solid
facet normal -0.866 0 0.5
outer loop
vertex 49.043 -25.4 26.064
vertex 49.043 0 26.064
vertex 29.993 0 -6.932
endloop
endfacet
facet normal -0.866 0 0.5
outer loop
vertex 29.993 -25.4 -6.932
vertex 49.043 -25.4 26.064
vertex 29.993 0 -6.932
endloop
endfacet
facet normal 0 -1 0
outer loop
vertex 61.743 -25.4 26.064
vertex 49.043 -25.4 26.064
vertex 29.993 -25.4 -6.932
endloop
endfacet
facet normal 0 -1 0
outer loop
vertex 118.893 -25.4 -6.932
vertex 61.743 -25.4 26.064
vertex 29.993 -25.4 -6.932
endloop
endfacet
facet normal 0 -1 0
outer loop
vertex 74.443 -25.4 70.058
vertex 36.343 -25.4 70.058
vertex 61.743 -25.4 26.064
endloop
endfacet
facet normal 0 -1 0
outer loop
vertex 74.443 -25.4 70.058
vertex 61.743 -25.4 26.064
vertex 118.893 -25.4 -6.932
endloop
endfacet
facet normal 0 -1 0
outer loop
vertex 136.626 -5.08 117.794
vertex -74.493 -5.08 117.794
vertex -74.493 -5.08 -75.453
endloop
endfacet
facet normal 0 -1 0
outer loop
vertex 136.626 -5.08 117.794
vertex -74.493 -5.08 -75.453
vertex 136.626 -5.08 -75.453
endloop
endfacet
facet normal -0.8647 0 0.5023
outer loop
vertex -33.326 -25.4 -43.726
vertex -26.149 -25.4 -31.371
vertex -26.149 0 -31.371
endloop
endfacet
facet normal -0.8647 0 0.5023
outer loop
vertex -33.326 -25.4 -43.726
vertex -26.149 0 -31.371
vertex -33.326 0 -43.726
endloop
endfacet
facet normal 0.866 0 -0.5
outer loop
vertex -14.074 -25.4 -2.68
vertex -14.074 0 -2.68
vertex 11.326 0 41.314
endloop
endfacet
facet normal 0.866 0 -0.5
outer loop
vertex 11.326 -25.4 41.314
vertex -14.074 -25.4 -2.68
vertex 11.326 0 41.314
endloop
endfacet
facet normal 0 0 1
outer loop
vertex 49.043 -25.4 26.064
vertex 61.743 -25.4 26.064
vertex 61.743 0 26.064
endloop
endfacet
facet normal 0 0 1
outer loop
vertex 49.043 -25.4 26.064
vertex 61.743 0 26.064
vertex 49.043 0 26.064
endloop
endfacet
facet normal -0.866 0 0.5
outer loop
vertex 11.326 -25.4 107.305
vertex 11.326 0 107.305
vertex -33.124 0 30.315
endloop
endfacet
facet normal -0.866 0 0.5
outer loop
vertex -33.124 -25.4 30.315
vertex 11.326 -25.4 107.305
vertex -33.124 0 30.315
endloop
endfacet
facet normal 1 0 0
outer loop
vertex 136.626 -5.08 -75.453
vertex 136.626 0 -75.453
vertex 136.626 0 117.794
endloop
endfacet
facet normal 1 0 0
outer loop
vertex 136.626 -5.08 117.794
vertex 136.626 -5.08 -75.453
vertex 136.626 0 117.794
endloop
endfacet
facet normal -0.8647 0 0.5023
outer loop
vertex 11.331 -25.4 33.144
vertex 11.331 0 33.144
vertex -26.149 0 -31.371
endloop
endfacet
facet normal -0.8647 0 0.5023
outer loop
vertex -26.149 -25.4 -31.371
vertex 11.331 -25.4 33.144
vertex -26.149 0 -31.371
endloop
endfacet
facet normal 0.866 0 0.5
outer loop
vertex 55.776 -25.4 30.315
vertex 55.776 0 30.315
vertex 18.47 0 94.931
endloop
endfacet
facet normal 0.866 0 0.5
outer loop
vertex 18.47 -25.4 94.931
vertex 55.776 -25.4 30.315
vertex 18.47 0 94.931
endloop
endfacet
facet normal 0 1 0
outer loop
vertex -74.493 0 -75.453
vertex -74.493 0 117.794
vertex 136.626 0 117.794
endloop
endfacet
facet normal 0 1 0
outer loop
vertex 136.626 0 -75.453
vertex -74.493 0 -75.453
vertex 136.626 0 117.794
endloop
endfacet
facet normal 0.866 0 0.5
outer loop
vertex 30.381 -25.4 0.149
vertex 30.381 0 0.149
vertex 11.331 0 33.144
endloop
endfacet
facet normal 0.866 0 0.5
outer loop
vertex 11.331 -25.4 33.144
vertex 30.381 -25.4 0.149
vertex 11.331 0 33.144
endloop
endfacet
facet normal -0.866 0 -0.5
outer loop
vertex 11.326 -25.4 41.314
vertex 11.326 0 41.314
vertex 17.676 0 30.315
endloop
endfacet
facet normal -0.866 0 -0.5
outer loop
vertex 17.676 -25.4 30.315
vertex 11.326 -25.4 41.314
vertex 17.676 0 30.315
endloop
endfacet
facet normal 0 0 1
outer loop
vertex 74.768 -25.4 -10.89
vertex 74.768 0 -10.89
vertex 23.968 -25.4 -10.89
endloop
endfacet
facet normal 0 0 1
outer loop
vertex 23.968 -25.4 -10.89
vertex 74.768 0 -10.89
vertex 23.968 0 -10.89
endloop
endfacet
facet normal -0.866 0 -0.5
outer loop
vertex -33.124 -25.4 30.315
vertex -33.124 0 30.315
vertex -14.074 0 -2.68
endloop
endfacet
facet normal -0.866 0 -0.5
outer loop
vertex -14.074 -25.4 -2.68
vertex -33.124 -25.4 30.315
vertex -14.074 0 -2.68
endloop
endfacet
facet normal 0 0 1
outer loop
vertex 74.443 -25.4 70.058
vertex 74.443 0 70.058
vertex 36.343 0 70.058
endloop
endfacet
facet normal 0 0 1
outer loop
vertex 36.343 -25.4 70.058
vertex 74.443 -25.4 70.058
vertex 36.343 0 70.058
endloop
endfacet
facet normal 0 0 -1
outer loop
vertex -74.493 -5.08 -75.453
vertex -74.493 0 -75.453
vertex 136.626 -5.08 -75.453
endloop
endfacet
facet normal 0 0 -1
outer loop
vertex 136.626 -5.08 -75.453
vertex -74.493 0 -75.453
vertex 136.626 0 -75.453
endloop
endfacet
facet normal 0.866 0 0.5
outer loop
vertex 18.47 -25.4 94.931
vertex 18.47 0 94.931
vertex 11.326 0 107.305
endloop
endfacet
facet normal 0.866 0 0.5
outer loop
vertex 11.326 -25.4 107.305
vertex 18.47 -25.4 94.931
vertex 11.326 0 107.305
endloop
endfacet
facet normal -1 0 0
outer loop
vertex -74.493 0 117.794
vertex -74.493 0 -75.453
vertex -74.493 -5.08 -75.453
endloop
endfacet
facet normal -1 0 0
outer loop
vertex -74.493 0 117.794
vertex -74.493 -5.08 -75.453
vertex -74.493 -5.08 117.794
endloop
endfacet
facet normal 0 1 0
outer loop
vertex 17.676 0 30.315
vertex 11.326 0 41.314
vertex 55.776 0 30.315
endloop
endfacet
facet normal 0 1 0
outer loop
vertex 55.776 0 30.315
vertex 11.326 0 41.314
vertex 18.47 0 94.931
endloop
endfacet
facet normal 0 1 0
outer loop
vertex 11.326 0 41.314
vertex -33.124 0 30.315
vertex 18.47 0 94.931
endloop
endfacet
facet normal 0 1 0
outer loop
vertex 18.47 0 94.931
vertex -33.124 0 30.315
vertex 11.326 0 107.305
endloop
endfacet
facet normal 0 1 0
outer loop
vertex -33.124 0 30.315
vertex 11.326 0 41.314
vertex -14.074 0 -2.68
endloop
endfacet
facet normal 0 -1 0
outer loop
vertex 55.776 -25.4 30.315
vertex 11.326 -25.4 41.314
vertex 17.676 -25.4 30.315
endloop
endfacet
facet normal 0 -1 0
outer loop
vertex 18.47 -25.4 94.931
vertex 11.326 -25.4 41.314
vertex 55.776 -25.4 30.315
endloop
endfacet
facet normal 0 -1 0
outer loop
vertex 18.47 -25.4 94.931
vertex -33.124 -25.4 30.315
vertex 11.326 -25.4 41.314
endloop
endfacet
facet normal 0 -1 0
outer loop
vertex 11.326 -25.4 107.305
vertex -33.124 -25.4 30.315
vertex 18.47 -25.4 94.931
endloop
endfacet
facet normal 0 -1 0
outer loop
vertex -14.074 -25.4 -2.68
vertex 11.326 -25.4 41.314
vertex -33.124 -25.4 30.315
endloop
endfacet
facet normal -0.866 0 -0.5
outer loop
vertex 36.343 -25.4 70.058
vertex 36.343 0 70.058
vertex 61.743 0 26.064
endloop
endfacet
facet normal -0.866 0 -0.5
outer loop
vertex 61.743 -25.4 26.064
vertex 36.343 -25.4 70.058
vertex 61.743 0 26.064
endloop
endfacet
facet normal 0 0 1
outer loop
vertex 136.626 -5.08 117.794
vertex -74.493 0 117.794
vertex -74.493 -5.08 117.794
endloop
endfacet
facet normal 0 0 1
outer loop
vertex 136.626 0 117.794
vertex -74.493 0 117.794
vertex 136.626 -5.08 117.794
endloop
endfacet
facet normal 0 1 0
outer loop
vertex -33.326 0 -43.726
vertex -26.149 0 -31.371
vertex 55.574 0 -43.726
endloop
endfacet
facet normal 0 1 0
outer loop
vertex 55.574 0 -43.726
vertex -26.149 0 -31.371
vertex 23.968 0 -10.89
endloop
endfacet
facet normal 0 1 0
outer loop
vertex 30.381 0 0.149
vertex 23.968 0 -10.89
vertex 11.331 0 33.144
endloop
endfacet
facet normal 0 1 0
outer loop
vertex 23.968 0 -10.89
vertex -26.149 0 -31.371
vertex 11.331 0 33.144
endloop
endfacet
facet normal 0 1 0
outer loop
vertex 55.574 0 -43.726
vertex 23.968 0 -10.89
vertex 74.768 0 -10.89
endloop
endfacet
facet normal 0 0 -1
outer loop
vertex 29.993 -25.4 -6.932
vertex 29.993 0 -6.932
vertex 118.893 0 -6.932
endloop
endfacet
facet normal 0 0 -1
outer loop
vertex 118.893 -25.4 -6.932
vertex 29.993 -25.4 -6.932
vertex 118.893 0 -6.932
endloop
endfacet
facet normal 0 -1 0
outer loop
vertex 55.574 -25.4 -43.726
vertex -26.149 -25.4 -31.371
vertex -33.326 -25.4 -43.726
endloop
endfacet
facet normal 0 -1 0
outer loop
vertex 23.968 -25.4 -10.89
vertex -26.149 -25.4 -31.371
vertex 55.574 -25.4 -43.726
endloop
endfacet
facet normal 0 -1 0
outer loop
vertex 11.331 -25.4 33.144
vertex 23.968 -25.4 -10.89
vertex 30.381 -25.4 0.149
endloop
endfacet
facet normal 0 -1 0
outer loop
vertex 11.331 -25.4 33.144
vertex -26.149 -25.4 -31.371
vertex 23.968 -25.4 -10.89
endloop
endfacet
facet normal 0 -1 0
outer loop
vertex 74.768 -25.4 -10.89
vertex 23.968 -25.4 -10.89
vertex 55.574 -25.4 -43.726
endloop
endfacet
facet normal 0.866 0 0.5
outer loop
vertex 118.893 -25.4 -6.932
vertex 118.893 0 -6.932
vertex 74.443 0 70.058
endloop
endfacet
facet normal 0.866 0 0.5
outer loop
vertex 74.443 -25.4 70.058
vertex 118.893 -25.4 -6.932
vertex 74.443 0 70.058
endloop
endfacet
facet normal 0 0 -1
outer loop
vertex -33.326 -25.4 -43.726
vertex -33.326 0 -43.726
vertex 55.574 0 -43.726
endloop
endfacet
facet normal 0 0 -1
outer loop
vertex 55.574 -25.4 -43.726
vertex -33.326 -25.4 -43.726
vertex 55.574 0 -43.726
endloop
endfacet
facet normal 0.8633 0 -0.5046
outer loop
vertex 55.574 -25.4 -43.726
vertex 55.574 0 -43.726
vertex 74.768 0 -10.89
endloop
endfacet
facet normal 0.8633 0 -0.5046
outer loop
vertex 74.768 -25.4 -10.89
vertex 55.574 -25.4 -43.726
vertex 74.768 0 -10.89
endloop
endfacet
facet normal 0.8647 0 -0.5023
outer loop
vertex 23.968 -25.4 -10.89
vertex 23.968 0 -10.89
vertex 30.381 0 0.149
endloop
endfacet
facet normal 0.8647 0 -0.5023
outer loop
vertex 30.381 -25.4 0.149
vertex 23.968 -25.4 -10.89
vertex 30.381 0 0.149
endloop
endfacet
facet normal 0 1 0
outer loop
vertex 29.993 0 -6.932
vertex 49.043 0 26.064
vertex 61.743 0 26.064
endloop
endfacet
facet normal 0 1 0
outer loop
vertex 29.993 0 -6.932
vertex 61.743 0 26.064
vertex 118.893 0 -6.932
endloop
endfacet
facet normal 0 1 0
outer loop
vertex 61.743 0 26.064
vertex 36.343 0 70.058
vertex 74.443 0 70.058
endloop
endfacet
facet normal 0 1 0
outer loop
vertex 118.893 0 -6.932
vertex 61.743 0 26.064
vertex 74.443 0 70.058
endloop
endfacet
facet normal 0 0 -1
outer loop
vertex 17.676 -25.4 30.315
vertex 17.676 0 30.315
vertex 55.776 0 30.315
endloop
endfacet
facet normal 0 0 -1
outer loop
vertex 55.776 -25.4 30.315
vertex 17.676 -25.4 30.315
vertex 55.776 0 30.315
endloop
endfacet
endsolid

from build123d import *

# Parameters (mm, degrees)
F1_W     = 211.119264
F1_H     = 193.24705
F2_DEPTH = 5.08
F3_DEPTH = 25.4


with BuildPart() as f2:
    # F1 (on Front) → F2 (new body)
    with BuildSketch(Plane.XZ):
        with Locations((31.066388, 21.170855)):
            Rectangle(F1_W, F1_H)
    extrude(amount=F2_DEPTH)


with BuildPart() as f3:
    # F0 (on Front) → F3 (new body)
    with BuildSketch(Plane.XZ):
        Polygon((-26.149142, -31.37113), (-33.326317, -43.72551), (55.573683, -43.72551), (74.767594, -10.890181), (23.967594, -10.890181), (30.380575, 0.14876), (11.330575, 33.144328), align=None)
        Polygon((18.469585, 94.931471), (11.325662, 107.30511), (-33.124338, 30.315451), (-14.074338, -2.680117), (11.325662, 41.313974), (17.675662, 30.315451), (55.775662, 30.315451), align=None)
        Polygon((104.604711, -6.931847), (118.892558, -6.931847), (74.442558, 70.057811), (36.342558, 70.057811), (61.742558, 26.063721), (49.042558, 26.063721), (29.992558, -6.931847), align=None)
    extrude(amount=F3_DEPTH)


solid = Compound([f2.part, f3.part])
